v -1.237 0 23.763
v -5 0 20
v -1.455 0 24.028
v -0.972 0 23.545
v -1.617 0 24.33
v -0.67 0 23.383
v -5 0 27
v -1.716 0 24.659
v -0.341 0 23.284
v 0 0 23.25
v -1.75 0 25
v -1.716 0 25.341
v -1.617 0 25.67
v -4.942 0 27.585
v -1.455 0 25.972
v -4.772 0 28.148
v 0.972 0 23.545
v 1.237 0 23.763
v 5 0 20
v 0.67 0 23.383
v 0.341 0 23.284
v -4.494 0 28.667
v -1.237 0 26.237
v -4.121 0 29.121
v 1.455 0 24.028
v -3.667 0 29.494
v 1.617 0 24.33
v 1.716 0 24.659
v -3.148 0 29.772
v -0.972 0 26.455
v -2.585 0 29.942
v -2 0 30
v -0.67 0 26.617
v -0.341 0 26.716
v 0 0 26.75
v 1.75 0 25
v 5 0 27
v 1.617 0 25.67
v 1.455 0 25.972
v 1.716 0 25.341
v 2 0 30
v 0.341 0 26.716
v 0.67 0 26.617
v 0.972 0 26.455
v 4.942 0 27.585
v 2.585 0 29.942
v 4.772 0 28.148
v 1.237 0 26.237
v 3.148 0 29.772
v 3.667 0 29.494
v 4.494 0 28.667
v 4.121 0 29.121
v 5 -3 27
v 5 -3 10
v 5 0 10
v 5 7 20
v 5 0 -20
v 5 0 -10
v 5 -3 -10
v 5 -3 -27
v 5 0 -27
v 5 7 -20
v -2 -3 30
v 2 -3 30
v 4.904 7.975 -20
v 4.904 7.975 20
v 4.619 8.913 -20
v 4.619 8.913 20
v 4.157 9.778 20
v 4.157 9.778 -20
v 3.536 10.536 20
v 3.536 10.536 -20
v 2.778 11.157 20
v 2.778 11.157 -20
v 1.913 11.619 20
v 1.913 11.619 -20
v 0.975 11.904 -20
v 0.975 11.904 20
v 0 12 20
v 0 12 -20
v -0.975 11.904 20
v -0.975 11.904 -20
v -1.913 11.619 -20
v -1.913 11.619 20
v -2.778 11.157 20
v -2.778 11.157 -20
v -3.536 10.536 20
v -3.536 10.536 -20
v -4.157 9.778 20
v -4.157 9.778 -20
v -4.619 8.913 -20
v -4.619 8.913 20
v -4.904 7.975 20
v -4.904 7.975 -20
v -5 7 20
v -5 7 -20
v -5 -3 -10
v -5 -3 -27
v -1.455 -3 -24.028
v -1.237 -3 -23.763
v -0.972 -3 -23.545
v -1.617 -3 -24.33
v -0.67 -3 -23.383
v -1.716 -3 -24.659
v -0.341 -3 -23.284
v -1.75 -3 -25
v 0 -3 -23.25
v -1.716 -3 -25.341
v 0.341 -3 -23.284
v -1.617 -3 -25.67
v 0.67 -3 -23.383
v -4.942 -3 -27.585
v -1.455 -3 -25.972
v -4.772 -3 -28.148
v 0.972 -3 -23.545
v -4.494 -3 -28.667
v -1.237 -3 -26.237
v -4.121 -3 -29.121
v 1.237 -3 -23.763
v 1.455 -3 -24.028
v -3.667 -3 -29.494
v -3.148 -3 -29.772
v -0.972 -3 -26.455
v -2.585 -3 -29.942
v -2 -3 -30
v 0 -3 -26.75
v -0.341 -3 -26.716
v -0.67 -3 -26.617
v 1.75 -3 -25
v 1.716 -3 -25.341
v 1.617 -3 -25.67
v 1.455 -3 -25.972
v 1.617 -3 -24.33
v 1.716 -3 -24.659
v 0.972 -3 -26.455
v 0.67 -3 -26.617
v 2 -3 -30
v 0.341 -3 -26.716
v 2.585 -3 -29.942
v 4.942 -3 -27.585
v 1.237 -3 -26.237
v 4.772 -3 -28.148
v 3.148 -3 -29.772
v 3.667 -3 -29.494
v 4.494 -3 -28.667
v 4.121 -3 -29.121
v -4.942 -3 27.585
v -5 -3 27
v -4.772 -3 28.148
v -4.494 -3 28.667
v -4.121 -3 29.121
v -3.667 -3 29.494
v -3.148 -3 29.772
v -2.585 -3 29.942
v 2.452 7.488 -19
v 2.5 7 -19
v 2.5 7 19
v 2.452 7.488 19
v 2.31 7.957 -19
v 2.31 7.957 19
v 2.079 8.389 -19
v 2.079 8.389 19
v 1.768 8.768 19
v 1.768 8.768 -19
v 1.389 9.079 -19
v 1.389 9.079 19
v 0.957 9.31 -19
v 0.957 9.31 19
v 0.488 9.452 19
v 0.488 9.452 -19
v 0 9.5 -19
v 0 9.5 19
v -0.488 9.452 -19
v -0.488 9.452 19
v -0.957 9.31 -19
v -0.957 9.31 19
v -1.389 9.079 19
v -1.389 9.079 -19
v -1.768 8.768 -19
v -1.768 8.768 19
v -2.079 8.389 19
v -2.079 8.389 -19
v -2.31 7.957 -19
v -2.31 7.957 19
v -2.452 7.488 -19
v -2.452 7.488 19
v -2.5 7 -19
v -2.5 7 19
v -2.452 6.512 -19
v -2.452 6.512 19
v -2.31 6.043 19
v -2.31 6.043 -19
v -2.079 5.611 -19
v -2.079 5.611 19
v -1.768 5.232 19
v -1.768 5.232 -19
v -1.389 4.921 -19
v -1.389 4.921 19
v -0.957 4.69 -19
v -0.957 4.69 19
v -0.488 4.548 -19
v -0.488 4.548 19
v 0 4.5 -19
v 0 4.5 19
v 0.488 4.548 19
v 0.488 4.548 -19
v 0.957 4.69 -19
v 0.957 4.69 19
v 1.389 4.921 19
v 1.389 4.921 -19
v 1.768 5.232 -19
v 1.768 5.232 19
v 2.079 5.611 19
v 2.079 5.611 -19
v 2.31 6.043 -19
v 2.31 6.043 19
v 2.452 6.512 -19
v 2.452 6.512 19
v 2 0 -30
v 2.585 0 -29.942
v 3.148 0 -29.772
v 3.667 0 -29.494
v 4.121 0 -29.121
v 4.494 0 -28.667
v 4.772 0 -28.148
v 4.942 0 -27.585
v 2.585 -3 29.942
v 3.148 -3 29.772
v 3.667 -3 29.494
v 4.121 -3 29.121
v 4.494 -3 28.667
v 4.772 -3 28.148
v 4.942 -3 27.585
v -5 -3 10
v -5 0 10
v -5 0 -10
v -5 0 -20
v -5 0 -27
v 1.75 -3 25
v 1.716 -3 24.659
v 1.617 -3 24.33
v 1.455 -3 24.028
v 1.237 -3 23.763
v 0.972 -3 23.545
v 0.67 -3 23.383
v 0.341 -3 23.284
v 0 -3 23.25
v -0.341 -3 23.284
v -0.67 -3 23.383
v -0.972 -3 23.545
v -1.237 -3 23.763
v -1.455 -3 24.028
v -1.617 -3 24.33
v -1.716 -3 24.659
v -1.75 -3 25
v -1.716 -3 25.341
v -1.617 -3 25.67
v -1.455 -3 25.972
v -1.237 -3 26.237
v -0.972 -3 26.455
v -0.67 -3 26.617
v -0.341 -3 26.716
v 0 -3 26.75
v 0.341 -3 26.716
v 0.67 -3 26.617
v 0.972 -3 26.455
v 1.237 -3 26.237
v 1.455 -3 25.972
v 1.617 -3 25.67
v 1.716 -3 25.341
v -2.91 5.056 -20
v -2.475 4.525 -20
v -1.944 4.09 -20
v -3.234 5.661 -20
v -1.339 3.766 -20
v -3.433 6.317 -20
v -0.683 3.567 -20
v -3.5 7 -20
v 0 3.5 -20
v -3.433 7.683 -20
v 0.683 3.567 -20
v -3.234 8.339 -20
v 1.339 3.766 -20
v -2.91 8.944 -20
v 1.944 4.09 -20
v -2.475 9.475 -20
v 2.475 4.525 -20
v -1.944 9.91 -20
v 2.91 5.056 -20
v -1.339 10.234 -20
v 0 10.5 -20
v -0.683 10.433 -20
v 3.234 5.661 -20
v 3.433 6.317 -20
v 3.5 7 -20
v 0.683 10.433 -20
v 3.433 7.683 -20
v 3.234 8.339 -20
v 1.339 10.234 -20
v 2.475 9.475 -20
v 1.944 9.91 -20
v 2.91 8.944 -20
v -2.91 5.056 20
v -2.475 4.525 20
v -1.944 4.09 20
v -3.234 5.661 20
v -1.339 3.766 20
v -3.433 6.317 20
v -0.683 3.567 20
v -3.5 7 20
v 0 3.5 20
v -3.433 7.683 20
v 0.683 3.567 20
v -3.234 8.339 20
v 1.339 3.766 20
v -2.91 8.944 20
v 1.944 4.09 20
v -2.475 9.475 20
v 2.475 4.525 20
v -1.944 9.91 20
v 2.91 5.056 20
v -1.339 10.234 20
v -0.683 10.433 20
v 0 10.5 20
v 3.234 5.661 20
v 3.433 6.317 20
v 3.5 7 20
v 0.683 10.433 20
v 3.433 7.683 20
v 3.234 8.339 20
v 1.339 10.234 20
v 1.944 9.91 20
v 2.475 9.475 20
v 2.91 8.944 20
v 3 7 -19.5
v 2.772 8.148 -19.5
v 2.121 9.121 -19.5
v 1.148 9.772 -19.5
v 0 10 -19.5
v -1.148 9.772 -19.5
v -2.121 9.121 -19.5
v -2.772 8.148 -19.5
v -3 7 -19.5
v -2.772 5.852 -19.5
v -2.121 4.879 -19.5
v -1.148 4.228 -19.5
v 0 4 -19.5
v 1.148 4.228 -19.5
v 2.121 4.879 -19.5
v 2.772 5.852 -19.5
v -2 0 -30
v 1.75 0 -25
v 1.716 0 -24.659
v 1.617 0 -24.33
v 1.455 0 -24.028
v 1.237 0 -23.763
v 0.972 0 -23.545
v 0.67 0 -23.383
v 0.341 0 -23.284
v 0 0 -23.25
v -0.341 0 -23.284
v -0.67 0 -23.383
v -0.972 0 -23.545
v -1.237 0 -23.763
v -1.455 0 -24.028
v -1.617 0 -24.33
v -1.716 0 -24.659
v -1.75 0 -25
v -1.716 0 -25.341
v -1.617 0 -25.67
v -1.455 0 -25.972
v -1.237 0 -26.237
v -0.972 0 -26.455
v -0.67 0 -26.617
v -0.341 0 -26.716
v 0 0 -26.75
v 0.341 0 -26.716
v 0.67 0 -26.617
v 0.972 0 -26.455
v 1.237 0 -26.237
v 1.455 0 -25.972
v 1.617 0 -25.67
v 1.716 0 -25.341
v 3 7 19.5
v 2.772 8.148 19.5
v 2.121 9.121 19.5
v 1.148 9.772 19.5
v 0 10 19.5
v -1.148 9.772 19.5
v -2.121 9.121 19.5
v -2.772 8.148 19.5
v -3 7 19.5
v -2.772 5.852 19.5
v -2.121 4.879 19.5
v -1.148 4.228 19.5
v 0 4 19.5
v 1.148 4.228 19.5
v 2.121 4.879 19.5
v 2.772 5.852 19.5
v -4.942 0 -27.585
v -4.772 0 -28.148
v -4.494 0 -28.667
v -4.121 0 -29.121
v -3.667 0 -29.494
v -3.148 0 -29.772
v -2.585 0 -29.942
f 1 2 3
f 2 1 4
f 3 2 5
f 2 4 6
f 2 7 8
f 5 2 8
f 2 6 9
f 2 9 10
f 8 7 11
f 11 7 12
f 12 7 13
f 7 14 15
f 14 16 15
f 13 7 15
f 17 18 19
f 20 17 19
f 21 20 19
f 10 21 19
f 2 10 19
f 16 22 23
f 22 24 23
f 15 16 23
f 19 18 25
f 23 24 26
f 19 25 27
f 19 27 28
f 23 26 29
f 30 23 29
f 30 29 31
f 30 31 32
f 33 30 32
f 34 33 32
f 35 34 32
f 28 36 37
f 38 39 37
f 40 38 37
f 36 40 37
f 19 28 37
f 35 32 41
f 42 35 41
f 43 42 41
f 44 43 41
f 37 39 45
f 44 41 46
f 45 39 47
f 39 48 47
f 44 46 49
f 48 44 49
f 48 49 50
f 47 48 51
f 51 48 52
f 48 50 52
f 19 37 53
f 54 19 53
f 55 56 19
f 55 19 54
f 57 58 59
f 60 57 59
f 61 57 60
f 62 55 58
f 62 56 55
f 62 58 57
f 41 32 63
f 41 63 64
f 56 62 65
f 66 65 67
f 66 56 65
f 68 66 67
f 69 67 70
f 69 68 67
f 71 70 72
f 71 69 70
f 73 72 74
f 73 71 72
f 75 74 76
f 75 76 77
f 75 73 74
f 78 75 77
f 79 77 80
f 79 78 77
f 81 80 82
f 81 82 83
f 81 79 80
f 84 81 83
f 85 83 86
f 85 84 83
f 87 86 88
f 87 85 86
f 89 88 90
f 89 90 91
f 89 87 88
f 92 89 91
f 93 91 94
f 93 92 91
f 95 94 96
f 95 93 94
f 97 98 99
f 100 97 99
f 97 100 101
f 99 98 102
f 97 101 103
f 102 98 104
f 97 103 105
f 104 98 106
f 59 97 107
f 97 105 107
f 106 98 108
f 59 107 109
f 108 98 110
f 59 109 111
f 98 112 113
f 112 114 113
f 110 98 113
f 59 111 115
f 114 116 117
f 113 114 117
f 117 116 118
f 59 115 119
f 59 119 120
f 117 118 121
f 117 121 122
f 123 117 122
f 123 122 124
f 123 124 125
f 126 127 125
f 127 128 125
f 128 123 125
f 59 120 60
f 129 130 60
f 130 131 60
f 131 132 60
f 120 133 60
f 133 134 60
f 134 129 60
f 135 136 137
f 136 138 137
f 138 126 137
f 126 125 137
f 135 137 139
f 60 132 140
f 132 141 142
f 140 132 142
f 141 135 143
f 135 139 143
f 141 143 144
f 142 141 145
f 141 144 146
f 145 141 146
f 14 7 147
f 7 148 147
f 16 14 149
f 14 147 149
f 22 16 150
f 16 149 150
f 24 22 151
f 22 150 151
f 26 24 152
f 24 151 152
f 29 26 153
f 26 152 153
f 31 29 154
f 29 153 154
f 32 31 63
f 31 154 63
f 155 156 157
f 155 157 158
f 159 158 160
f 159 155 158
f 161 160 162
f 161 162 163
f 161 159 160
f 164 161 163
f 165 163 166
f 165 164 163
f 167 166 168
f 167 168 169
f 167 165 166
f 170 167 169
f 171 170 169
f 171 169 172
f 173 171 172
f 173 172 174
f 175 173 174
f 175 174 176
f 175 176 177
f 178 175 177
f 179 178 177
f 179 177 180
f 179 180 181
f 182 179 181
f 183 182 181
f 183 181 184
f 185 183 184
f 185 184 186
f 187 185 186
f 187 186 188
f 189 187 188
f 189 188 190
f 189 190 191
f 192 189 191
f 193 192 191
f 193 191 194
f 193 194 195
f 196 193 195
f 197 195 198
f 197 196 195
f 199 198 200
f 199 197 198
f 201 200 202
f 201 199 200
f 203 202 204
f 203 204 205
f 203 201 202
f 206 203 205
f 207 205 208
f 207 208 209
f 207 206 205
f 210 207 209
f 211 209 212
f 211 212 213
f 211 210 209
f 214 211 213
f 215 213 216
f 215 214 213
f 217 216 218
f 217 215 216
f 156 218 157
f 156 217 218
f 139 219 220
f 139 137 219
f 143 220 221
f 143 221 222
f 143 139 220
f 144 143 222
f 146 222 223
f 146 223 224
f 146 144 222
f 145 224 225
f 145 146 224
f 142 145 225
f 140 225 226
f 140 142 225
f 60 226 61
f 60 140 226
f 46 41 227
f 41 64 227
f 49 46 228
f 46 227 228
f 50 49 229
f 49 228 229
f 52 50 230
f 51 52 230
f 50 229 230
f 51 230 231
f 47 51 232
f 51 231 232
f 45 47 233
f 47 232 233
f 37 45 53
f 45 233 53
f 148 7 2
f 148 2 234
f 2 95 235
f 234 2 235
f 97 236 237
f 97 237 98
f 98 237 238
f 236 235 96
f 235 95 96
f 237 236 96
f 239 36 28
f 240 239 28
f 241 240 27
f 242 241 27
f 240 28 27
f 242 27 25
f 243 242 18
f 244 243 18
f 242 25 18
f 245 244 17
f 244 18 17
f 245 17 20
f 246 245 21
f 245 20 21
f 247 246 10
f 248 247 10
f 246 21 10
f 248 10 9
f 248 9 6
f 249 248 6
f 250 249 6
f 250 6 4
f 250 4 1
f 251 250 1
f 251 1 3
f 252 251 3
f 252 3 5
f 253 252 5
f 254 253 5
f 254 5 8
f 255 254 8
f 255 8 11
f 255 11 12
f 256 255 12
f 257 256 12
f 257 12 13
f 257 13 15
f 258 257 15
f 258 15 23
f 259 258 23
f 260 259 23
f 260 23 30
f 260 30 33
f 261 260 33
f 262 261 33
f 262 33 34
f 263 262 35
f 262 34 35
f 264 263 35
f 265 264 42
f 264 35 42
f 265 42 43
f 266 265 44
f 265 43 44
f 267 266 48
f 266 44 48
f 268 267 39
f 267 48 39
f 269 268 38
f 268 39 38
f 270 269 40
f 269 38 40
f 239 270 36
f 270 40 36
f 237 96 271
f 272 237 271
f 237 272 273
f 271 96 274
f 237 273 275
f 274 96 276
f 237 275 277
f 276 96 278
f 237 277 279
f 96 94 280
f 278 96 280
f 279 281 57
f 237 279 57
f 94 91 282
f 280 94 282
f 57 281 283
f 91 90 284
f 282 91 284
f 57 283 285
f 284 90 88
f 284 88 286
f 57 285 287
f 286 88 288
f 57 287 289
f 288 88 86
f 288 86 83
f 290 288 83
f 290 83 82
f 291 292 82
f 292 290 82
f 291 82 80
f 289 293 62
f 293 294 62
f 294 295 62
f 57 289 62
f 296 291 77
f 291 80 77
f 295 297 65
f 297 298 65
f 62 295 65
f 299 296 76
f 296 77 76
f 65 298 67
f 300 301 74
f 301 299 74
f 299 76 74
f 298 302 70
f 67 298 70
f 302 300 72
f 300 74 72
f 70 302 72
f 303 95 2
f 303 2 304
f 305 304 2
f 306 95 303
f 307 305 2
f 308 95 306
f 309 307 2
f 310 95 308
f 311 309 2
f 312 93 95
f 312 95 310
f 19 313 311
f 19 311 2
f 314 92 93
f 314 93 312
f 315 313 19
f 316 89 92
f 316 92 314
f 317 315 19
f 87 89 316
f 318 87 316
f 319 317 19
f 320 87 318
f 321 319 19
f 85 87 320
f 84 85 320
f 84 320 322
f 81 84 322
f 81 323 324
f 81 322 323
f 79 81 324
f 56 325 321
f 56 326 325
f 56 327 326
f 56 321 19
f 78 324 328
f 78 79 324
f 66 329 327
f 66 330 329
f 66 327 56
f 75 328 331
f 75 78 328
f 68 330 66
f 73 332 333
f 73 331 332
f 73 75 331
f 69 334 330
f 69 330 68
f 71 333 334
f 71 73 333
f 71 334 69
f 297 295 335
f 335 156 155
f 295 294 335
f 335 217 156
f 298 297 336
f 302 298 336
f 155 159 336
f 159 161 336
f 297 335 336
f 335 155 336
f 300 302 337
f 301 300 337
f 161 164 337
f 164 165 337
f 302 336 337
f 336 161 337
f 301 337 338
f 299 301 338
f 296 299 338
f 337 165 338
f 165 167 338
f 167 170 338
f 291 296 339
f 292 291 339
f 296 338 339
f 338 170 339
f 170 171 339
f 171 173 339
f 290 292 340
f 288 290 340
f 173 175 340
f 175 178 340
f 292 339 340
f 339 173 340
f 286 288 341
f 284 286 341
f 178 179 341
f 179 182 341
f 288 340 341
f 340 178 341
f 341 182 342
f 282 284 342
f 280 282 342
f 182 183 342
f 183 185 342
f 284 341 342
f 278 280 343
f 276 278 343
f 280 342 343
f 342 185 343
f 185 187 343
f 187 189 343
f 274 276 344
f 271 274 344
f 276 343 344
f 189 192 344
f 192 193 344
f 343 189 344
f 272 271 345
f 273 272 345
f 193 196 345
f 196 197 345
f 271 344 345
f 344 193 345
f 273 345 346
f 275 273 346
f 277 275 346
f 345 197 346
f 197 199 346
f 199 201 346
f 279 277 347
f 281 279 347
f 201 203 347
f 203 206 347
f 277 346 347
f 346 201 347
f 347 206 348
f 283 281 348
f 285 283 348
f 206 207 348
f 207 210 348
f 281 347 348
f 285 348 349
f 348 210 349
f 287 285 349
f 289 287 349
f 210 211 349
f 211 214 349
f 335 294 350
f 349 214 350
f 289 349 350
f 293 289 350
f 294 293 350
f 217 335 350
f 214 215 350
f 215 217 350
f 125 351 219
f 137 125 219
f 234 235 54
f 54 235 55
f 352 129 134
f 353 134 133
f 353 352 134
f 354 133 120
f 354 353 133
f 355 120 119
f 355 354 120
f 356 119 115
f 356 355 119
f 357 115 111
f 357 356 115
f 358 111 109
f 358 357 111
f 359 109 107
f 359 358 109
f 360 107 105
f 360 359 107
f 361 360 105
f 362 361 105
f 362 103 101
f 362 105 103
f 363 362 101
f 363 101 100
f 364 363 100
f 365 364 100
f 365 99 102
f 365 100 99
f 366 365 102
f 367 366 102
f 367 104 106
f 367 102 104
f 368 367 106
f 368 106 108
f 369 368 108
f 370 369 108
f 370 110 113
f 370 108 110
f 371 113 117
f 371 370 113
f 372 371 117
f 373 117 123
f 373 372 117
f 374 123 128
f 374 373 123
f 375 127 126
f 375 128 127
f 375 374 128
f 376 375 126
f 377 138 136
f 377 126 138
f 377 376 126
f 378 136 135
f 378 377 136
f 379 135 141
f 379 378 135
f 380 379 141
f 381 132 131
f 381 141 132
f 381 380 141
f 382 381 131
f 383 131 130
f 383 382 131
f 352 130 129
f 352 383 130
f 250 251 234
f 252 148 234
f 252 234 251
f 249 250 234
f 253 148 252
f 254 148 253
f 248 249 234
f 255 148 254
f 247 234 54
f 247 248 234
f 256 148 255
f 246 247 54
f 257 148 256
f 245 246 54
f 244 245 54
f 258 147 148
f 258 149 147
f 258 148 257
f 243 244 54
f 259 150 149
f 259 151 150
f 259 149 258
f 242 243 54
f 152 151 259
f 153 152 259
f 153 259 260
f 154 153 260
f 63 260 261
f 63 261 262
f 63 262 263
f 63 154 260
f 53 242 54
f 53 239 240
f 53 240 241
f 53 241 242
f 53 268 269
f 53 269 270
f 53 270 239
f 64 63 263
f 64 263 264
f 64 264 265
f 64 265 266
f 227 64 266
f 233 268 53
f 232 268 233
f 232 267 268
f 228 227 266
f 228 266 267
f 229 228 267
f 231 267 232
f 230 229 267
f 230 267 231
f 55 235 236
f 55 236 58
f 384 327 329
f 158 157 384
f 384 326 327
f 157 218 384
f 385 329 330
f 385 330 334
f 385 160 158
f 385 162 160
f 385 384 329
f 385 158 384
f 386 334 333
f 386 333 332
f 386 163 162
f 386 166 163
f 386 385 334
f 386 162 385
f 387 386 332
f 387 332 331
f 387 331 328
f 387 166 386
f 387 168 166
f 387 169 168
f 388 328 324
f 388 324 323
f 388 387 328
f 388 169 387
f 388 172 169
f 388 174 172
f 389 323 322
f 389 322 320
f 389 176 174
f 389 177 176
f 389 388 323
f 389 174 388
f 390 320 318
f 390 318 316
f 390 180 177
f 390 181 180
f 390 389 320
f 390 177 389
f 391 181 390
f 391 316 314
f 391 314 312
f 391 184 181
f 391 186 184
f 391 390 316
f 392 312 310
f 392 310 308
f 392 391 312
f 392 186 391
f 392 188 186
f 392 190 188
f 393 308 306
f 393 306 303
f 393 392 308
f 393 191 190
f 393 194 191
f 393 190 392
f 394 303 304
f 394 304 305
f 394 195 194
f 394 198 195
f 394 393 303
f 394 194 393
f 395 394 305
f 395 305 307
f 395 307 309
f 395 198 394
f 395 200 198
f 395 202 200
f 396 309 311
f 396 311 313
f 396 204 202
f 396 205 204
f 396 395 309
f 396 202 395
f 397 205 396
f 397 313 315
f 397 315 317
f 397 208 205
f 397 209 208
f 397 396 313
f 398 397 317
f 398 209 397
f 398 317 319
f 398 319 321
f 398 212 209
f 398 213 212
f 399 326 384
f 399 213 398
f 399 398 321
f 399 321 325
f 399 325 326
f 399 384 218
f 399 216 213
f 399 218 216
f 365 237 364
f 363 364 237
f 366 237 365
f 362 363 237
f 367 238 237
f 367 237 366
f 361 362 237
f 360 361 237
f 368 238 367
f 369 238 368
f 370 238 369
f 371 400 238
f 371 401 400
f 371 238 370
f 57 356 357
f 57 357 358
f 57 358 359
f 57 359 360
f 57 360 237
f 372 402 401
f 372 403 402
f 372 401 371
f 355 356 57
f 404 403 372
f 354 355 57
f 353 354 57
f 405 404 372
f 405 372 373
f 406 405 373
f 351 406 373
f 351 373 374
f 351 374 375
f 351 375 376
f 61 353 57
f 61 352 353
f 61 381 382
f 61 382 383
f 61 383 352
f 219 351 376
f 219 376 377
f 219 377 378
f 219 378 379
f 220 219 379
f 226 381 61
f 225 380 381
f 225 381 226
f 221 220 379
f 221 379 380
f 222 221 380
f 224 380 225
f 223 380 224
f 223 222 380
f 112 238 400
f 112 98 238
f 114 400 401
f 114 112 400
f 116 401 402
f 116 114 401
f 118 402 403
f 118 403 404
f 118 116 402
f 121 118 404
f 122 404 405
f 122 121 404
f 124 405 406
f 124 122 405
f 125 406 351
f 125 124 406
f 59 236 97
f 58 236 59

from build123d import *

# Parameters (mm, degrees)
SKETCH_1_R             = 2.5
EXTRUDE_1_DEPTH        = 20
SKETCH_2_W             = 10
SKETCH_2_H             = 20
EXTRUDE_2_DEPTH        = 3
SKETCH_3_R             = 1.75
CUT_EXTRUDE_1_DEPTH    = 4
FILLET_1_R             = 3
FILLET_1_OF_MIRROR_1_R = 3
CHAMFER_1_SIZE         = 1


with BuildPart() as part:
    # ｽｹｯﾁ1 → ﾎﾞｽ - 押し出し1 (new body, symmetric)
    with BuildSketch(Plane.XY):
        with BuildLine():
            Line((-5, 0), (5, 0))
            Line((5, 0), (5, 7))
            ThreePointArc((5, 7), (0, 12), (-5, 7))
            Line((-5, 7), (-5, 0))
        make_face()
        with Locations((0, 7)):
            Circle(SKETCH_1_R, mode=Mode.SUBTRACT)
    extrude(amount=EXTRUDE_1_DEPTH, both=True)

    # ｽｹｯﾁ2 → ﾎﾞｽ - 押し出し2 (add)
    with BuildSketch(Plane.XZ):
        with Locations((0, 20)):
            Rectangle(SKETCH_2_W, SKETCH_2_H)
    extrude_2 = extrude(amount=EXTRUDE_2_DEPTH)

    # ｽｹｯﾁ3 → ｶｯﾄ - 押し出し1 (cut, through all)
    with BuildSketch(Plane(origin=(0, 0, 0), x_dir=(1, 0, 0), z_dir=(0, 1, 0))):
        with Locations((0, -25)):
            Circle(SKETCH_3_R)
    cut_extrude_1 = extrude(amount=-CUT_EXTRUDE_1_DEPTH, mode=Mode.SUBTRACT)

    # ﾌｨﾚｯﾄ1
    fillet_1_edges = [part.edges().sort_by_distance(p)[0] for p in [
        (-5, -1.5, 30),
        (5, -1.5, 30),
    ]]
    fillet(fillet_1_edges, radius=FILLET_1_R)

    # ﾐﾗｰ1: ﾎﾞｽ - 押し出し2, ｶｯﾄ - 押し出し1 across plane
    add(extrude_2.mirror(Plane.XY))
    add(cut_extrude_1.mirror(Plane.XY), mode=Mode.SUBTRACT)

    # ﾌｨﾚｯﾄ1 of ﾐﾗｰ1
    fillet_1_of_mirror_1_edges = [part.edges().sort_by_distance(p)[0] for p in [
        (-5, -1.5, -30),
        (5, -1.5, -30),
    ]]
    fillet(fillet_1_of_mirror_1_edges, radius=FILLET_1_OF_MIRROR_1_R)

    # 面取り1
    chamfer_1_edges = [part.edges().sort_by_distance(p)[0] for p in [
        (-2.5, 7, -20),
        (-2.5, 7, 20),
    ]]
    chamfer(chamfer_1_edges, length=CHAMFER_1_SIZE)


solid = part.part
